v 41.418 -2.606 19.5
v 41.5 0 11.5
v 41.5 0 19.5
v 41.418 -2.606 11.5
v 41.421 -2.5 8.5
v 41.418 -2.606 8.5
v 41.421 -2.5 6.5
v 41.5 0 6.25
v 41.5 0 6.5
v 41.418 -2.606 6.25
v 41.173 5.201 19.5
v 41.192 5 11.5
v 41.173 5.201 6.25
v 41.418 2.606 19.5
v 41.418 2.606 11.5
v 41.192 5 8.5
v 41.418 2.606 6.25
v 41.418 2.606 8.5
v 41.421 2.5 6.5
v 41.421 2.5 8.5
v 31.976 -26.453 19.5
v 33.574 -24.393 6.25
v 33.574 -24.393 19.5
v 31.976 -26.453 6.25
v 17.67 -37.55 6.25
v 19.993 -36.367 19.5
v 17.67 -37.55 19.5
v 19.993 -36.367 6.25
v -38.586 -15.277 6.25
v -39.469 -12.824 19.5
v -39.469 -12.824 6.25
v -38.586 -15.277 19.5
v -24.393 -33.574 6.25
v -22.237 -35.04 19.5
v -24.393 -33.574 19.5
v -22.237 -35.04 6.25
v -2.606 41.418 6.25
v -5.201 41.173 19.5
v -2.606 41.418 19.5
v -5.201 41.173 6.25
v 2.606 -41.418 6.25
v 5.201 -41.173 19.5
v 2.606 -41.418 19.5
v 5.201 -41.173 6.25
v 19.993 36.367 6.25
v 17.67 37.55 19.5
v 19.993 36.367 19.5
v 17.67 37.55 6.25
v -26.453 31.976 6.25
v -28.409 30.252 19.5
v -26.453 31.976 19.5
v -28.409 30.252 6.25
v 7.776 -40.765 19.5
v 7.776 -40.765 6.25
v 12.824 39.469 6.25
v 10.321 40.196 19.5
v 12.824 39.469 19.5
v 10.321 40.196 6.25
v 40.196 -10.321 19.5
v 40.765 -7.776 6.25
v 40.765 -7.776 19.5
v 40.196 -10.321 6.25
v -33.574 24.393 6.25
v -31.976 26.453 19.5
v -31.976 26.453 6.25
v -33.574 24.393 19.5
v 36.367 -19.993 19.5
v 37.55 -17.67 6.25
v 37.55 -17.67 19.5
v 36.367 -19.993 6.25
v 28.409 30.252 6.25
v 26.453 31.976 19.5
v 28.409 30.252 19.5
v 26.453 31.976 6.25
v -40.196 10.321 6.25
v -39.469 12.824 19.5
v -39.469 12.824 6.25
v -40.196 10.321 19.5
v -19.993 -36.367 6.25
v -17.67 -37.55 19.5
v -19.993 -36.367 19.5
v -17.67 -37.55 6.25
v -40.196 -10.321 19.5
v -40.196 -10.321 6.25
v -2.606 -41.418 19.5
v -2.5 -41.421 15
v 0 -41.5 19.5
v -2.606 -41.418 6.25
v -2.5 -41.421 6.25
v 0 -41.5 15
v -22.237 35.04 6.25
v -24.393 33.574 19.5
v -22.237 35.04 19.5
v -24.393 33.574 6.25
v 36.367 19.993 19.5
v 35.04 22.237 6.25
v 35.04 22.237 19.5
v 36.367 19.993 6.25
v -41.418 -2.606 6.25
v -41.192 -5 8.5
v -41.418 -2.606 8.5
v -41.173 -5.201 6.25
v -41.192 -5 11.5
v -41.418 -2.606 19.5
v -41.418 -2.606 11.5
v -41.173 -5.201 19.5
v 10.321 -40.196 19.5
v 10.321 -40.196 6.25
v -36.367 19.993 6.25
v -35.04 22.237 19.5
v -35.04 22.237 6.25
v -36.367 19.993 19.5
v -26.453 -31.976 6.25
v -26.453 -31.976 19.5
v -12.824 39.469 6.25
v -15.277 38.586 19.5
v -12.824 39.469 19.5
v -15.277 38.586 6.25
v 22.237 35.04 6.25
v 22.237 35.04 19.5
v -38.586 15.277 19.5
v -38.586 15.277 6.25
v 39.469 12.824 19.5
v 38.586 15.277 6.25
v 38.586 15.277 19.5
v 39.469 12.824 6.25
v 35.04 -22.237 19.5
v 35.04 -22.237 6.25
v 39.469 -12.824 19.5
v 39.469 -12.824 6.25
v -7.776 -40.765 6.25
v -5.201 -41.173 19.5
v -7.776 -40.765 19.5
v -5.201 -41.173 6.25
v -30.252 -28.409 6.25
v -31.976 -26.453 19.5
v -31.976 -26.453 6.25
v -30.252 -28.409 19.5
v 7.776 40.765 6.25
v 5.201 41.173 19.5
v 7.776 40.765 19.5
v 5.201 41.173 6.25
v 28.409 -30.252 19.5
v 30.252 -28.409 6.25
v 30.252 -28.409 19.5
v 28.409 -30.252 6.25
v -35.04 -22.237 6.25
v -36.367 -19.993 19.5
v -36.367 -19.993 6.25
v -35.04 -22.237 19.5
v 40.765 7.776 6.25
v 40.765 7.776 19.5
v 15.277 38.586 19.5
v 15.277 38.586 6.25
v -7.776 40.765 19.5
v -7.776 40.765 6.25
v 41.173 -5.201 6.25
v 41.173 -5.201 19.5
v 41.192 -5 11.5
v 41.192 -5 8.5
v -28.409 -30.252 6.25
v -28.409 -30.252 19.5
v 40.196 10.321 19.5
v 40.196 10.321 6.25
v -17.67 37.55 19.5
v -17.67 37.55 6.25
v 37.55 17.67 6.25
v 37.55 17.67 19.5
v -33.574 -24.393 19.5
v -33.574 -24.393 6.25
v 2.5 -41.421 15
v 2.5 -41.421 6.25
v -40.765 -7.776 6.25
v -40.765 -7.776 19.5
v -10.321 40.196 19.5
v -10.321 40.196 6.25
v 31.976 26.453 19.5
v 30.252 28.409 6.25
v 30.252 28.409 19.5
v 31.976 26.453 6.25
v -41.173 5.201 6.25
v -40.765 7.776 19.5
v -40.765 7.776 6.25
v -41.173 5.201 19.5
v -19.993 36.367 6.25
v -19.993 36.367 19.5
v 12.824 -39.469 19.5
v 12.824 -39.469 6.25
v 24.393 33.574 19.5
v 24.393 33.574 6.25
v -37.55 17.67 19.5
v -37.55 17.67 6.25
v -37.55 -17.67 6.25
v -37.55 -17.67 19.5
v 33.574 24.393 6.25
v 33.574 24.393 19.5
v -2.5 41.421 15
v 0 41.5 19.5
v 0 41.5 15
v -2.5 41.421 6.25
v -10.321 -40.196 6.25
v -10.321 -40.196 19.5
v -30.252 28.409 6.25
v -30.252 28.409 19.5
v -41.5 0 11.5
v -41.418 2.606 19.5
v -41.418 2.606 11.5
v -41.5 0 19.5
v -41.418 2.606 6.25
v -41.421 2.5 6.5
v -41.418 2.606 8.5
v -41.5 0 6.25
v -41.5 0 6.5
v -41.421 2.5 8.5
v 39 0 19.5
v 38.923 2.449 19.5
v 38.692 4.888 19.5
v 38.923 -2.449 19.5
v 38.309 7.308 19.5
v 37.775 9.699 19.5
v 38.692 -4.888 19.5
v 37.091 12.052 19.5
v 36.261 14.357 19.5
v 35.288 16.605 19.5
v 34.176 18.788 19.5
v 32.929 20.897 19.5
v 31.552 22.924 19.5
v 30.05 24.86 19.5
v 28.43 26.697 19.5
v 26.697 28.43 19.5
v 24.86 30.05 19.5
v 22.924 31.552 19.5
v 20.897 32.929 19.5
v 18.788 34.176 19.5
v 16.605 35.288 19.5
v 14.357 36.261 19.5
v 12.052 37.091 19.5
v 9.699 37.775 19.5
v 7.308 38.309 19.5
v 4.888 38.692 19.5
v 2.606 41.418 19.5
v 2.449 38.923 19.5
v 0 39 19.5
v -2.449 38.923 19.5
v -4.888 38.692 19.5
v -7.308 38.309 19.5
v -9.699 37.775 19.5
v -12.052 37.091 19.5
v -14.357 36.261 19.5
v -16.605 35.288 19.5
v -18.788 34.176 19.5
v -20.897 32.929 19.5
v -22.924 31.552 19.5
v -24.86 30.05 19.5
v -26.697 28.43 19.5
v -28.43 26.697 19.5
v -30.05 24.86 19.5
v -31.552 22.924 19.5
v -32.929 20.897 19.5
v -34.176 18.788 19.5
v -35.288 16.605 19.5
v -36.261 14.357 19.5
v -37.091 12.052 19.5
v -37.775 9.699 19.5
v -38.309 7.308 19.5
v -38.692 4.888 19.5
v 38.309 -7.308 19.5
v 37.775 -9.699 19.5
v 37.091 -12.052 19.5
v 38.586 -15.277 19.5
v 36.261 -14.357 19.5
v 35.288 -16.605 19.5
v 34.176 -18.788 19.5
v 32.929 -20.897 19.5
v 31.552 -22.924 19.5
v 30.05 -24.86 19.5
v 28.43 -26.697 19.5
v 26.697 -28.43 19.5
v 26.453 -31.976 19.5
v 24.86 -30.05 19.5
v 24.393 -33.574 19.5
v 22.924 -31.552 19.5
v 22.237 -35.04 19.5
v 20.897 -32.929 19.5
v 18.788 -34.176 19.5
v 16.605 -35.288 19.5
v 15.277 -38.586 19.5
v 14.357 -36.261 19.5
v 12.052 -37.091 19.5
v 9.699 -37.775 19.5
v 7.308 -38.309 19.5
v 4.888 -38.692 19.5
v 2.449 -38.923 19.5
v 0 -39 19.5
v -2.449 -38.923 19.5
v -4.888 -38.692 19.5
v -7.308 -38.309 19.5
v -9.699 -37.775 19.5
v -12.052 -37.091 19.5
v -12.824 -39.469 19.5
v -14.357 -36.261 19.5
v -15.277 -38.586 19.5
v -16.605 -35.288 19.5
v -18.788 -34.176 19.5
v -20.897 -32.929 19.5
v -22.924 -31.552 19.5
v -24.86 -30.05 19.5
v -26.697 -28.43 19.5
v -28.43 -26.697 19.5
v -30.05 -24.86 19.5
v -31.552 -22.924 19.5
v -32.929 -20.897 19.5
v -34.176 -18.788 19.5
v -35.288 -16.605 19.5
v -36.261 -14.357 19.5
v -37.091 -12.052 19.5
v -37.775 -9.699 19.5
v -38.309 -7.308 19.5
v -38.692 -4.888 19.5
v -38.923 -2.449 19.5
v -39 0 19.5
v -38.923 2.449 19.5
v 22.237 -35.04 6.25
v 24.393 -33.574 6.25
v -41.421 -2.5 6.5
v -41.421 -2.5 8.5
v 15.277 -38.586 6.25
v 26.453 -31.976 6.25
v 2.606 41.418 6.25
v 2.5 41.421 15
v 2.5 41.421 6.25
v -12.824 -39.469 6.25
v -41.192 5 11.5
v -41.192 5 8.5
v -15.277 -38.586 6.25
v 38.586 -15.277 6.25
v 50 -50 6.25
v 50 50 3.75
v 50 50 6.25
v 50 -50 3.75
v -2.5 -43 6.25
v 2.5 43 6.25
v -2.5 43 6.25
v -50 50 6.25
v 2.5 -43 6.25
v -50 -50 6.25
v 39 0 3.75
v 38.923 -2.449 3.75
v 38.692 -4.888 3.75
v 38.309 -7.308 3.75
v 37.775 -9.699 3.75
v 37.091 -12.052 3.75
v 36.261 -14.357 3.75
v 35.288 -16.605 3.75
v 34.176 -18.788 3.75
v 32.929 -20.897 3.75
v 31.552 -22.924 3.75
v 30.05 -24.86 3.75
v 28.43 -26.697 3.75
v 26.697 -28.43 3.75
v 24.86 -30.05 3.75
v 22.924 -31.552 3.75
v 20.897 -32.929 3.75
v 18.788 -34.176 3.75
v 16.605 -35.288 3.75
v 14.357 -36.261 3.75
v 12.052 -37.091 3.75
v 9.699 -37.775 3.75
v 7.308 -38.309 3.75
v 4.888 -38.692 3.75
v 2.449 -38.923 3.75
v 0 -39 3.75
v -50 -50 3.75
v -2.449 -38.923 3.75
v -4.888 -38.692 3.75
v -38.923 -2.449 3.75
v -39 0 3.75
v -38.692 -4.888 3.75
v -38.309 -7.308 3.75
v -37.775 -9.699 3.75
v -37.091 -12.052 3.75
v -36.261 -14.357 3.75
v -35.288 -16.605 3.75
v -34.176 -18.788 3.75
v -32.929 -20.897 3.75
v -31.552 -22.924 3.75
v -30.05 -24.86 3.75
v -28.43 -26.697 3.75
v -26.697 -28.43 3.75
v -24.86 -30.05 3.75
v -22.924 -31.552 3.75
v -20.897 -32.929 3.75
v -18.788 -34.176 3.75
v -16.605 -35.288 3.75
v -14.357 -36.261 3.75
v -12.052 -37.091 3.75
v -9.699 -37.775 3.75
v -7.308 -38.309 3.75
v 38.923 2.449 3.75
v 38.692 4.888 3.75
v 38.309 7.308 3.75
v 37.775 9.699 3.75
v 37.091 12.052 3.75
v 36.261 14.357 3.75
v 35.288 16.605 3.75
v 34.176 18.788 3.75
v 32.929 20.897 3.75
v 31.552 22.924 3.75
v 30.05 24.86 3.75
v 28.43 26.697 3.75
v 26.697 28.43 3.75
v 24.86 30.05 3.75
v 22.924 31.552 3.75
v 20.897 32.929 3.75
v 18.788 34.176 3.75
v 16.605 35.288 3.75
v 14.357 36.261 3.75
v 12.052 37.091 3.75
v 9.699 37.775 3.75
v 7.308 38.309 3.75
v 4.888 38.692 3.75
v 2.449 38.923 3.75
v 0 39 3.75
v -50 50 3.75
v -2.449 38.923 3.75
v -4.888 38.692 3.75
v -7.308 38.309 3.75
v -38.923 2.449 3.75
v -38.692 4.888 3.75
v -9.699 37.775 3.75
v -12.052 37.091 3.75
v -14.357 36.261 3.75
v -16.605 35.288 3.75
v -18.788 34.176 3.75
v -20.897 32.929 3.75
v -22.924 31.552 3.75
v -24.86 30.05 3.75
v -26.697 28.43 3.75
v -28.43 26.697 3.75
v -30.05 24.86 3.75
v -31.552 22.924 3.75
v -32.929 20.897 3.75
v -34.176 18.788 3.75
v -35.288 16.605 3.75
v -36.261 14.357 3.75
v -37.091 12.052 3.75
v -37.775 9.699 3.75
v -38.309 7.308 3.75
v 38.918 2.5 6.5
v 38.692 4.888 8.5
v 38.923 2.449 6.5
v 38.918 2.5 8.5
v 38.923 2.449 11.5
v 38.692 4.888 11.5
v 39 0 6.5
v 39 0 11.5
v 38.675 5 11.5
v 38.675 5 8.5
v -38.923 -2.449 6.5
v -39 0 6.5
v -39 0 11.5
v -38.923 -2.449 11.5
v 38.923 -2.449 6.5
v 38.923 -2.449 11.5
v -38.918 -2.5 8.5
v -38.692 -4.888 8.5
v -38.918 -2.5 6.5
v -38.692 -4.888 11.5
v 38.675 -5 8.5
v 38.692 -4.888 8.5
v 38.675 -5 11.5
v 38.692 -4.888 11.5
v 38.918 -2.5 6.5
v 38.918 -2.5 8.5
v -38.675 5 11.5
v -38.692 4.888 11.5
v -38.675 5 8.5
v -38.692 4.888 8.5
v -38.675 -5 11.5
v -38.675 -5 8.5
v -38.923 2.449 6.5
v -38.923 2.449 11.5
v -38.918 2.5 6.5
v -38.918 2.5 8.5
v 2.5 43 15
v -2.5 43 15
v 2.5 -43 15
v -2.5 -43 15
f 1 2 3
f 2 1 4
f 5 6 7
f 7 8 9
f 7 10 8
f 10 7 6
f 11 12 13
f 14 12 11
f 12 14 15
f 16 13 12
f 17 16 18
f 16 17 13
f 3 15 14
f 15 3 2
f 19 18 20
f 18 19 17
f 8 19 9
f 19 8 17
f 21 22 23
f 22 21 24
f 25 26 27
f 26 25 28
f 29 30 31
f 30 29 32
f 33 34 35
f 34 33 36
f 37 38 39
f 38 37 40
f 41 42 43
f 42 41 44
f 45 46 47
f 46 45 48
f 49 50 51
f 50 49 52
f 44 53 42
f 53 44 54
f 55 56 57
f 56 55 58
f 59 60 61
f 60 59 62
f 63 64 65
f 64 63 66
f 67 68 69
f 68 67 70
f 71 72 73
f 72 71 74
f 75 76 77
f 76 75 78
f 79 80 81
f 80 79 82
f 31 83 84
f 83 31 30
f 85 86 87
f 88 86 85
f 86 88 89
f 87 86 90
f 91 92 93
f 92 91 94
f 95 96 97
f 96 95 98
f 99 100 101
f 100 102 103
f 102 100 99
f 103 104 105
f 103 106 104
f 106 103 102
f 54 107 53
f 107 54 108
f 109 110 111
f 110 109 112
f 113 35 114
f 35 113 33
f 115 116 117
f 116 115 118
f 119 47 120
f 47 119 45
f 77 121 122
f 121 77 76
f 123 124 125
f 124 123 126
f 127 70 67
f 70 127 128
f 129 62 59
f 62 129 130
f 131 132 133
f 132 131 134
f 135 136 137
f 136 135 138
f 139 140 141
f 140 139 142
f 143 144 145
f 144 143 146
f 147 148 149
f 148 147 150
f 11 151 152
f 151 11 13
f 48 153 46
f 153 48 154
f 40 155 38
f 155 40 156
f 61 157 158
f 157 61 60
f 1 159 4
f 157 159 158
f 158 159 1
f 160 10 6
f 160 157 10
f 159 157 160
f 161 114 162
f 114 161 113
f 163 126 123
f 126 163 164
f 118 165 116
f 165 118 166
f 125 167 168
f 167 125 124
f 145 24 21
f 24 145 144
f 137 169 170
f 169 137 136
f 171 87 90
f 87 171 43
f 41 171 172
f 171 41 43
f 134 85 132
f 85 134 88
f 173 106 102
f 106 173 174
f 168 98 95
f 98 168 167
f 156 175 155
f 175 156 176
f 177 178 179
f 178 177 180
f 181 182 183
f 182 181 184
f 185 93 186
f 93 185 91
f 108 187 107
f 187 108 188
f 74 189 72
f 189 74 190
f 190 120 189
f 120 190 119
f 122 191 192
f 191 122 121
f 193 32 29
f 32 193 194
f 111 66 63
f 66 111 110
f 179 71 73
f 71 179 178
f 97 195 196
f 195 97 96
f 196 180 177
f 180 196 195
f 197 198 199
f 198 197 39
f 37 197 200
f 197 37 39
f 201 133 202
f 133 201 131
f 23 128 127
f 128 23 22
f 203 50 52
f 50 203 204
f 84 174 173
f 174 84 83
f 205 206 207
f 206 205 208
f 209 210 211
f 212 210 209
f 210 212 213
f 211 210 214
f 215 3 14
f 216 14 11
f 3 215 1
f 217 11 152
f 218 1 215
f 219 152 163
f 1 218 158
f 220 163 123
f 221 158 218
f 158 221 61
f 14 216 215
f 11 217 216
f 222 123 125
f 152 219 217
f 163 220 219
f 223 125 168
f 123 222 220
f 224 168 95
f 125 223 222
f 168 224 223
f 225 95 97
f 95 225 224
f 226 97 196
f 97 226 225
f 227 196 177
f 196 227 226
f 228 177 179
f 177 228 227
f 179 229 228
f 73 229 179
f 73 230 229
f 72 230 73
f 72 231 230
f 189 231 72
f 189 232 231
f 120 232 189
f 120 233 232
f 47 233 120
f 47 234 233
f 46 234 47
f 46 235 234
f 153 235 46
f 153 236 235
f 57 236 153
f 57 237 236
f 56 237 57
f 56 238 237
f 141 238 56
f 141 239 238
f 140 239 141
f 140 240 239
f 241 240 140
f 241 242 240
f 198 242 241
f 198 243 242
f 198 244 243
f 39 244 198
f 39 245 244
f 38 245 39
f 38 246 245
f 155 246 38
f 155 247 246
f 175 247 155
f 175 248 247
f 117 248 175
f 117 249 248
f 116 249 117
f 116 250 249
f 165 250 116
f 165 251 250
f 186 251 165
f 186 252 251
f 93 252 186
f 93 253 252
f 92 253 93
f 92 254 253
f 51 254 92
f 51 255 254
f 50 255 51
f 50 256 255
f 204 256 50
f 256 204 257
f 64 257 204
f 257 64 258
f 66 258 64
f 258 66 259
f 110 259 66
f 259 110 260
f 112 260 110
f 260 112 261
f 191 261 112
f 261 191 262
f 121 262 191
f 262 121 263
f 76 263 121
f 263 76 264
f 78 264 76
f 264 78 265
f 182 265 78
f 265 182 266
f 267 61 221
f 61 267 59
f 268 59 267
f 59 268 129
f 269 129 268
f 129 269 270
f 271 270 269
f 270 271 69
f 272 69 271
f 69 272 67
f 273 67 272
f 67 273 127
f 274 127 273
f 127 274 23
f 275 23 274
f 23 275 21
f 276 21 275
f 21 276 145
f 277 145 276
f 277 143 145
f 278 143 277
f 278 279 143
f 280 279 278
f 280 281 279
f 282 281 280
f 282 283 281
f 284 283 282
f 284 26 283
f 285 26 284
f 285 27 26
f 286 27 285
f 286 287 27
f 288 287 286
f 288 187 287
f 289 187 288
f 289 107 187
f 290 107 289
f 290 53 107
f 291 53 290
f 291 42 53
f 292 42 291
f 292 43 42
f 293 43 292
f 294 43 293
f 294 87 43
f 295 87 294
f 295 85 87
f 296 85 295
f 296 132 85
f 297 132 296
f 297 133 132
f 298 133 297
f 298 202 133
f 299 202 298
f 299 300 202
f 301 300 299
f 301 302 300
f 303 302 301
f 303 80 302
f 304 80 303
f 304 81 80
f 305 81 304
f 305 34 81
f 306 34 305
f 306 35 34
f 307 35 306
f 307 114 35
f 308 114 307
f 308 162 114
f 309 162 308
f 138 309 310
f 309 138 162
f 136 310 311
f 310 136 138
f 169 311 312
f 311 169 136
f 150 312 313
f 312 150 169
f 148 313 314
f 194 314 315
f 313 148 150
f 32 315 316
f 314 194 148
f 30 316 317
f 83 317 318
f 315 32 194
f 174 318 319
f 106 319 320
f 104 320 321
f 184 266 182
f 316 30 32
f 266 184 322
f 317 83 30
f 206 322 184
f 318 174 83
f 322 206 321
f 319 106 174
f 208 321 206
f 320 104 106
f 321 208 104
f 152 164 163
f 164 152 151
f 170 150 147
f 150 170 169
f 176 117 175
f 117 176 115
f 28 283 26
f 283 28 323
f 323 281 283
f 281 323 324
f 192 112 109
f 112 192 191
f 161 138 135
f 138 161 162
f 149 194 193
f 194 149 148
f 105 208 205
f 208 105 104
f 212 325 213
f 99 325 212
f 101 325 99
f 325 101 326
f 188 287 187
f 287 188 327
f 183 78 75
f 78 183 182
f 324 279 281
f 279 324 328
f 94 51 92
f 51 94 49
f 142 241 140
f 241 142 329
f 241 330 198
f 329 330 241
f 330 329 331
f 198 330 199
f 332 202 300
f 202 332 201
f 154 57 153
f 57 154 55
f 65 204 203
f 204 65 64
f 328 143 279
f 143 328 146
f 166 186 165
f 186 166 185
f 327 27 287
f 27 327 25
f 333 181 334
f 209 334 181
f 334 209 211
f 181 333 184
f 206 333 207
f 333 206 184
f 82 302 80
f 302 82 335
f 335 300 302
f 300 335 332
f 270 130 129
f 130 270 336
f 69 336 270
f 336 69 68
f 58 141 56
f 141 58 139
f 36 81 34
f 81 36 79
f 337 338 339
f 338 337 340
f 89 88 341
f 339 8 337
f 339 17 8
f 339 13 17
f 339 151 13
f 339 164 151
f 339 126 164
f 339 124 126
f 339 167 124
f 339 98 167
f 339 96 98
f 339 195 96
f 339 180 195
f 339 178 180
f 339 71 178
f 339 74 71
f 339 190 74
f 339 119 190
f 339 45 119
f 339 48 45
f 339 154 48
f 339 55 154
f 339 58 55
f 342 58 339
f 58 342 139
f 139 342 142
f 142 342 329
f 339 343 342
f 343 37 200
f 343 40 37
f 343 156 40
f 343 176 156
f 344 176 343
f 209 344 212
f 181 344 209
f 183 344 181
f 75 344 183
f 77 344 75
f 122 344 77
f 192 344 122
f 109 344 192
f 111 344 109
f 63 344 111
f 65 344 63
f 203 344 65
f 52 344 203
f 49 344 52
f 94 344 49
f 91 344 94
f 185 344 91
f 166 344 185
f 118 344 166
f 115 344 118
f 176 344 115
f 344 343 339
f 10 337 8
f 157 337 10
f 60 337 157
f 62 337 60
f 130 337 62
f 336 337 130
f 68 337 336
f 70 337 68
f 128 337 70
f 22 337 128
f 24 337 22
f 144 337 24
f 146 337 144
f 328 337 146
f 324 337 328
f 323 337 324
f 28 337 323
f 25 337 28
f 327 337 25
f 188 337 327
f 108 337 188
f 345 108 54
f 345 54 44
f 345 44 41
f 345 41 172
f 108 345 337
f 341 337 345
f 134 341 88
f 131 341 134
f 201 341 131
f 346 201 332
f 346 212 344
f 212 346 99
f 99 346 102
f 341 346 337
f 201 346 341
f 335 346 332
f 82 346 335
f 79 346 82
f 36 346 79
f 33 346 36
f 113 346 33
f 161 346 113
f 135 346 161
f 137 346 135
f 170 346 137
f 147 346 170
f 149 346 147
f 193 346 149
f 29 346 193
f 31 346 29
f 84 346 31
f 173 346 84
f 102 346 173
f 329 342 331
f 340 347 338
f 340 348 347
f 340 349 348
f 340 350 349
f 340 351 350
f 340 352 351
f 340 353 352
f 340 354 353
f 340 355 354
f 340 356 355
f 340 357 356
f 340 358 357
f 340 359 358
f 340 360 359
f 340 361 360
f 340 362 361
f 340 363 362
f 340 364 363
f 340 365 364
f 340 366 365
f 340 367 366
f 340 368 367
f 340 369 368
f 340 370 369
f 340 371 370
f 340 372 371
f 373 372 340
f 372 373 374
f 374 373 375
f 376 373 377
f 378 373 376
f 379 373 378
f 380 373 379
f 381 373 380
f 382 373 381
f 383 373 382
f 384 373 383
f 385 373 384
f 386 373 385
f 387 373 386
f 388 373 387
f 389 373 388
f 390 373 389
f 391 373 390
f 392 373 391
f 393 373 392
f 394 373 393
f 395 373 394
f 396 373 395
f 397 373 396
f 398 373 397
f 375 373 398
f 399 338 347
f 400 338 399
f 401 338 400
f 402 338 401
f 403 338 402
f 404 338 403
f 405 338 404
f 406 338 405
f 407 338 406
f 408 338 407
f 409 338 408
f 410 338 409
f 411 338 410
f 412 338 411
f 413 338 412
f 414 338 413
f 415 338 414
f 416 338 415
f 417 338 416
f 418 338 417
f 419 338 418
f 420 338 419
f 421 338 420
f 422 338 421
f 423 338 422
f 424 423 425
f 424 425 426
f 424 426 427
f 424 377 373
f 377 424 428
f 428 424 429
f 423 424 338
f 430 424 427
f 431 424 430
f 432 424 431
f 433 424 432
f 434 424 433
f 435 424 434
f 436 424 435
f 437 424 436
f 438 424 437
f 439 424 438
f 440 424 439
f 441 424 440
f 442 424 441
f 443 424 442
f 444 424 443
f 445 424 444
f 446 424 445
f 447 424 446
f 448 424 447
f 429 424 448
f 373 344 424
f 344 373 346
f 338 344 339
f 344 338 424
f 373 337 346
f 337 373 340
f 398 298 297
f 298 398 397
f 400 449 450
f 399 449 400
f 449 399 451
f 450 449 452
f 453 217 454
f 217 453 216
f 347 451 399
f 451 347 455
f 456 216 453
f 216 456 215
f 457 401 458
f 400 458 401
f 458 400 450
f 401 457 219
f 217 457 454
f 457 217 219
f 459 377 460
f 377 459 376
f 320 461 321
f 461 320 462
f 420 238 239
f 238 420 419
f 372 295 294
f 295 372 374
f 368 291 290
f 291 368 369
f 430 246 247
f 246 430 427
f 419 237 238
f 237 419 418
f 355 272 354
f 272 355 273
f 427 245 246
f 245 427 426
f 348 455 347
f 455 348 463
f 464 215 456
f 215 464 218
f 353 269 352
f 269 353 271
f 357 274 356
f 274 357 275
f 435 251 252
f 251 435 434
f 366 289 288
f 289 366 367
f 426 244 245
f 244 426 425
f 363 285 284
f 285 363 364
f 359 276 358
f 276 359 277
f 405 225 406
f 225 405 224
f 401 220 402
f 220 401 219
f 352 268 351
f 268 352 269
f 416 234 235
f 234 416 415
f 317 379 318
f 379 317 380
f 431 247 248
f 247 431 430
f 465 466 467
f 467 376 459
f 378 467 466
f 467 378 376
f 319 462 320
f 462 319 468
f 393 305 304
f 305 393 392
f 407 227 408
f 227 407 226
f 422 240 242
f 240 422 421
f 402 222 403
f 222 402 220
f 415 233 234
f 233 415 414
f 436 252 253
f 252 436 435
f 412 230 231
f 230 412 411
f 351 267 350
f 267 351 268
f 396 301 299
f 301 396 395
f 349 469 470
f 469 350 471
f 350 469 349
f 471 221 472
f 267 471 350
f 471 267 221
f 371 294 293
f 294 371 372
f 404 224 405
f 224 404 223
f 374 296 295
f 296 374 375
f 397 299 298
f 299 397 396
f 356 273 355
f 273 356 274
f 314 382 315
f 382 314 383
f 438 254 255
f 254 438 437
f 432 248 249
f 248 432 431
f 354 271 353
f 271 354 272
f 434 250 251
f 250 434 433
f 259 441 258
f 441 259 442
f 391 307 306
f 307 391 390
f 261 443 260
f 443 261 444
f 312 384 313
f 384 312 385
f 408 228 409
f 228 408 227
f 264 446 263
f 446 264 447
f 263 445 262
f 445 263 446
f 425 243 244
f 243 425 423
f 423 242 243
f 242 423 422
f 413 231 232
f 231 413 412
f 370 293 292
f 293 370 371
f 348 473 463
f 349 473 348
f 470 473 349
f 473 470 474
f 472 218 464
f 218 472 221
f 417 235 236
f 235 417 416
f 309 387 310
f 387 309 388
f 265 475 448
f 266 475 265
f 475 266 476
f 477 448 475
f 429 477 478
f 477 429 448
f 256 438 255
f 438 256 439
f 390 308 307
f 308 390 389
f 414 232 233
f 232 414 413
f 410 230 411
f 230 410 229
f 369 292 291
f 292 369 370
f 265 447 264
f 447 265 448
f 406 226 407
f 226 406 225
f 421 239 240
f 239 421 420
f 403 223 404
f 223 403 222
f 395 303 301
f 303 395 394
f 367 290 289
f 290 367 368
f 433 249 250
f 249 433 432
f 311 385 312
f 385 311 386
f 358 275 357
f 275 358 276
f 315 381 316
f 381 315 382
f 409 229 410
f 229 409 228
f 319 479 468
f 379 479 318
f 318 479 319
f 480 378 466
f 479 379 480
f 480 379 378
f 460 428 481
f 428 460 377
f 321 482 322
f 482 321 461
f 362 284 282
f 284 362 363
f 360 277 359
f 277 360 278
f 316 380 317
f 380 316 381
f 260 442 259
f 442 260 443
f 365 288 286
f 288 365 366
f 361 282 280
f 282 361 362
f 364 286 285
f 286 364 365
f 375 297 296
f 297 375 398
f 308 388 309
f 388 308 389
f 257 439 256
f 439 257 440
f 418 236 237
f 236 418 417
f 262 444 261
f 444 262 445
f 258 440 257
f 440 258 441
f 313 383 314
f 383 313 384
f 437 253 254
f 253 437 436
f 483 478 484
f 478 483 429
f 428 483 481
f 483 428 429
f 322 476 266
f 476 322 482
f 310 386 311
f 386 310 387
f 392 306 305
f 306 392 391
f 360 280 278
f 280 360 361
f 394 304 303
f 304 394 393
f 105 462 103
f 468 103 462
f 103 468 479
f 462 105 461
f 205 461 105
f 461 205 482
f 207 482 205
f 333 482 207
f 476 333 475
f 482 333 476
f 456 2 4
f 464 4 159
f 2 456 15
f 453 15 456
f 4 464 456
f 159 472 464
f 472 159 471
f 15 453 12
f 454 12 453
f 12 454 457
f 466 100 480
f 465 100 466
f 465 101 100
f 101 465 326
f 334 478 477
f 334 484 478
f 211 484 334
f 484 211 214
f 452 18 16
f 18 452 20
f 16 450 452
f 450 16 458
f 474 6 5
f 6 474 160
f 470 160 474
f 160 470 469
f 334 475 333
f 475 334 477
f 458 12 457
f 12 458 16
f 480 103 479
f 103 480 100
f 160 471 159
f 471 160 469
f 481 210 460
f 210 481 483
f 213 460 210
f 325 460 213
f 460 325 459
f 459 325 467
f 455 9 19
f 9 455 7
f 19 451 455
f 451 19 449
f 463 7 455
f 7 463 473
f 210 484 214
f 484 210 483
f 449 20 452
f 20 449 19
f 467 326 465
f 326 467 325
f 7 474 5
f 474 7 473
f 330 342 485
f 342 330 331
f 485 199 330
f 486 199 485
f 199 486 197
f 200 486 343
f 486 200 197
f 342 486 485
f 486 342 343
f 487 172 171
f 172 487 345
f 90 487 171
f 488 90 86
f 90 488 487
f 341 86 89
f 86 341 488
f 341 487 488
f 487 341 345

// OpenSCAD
// WASABI Niko
// 2020 cpu cooler holder
// GNU GPL v3
// SANTA no Mix
// https://ameblo.jp/math-physics/theme-10117154956.html
// https://github.com/SantaNoMix/
$fn = 100;
difference () {
    difference () {
        union () {
            translate ([0,0,12]) {
                cylinder (15,41.5,41.5,center = true);
            }
            translate ([0,0,5]) {
                cube ([100,100,2.5],center = true);
            }
        }
        translate ([0,0,15]) {
            cylinder (30,39,39,center = true);
        }
    }
    translate ([0,0,10]) {
        cube ([200,10,3],center = true);
    }
    translate ([0,0,8]) {
        cube ([200,5,3],center = true);
    }
}
translate ([0,42,10]) {
    cube ([5,2,10],center = true);
}
translate ([0,-42,10]) {
    cube ([5,2,10],center = true);
}
